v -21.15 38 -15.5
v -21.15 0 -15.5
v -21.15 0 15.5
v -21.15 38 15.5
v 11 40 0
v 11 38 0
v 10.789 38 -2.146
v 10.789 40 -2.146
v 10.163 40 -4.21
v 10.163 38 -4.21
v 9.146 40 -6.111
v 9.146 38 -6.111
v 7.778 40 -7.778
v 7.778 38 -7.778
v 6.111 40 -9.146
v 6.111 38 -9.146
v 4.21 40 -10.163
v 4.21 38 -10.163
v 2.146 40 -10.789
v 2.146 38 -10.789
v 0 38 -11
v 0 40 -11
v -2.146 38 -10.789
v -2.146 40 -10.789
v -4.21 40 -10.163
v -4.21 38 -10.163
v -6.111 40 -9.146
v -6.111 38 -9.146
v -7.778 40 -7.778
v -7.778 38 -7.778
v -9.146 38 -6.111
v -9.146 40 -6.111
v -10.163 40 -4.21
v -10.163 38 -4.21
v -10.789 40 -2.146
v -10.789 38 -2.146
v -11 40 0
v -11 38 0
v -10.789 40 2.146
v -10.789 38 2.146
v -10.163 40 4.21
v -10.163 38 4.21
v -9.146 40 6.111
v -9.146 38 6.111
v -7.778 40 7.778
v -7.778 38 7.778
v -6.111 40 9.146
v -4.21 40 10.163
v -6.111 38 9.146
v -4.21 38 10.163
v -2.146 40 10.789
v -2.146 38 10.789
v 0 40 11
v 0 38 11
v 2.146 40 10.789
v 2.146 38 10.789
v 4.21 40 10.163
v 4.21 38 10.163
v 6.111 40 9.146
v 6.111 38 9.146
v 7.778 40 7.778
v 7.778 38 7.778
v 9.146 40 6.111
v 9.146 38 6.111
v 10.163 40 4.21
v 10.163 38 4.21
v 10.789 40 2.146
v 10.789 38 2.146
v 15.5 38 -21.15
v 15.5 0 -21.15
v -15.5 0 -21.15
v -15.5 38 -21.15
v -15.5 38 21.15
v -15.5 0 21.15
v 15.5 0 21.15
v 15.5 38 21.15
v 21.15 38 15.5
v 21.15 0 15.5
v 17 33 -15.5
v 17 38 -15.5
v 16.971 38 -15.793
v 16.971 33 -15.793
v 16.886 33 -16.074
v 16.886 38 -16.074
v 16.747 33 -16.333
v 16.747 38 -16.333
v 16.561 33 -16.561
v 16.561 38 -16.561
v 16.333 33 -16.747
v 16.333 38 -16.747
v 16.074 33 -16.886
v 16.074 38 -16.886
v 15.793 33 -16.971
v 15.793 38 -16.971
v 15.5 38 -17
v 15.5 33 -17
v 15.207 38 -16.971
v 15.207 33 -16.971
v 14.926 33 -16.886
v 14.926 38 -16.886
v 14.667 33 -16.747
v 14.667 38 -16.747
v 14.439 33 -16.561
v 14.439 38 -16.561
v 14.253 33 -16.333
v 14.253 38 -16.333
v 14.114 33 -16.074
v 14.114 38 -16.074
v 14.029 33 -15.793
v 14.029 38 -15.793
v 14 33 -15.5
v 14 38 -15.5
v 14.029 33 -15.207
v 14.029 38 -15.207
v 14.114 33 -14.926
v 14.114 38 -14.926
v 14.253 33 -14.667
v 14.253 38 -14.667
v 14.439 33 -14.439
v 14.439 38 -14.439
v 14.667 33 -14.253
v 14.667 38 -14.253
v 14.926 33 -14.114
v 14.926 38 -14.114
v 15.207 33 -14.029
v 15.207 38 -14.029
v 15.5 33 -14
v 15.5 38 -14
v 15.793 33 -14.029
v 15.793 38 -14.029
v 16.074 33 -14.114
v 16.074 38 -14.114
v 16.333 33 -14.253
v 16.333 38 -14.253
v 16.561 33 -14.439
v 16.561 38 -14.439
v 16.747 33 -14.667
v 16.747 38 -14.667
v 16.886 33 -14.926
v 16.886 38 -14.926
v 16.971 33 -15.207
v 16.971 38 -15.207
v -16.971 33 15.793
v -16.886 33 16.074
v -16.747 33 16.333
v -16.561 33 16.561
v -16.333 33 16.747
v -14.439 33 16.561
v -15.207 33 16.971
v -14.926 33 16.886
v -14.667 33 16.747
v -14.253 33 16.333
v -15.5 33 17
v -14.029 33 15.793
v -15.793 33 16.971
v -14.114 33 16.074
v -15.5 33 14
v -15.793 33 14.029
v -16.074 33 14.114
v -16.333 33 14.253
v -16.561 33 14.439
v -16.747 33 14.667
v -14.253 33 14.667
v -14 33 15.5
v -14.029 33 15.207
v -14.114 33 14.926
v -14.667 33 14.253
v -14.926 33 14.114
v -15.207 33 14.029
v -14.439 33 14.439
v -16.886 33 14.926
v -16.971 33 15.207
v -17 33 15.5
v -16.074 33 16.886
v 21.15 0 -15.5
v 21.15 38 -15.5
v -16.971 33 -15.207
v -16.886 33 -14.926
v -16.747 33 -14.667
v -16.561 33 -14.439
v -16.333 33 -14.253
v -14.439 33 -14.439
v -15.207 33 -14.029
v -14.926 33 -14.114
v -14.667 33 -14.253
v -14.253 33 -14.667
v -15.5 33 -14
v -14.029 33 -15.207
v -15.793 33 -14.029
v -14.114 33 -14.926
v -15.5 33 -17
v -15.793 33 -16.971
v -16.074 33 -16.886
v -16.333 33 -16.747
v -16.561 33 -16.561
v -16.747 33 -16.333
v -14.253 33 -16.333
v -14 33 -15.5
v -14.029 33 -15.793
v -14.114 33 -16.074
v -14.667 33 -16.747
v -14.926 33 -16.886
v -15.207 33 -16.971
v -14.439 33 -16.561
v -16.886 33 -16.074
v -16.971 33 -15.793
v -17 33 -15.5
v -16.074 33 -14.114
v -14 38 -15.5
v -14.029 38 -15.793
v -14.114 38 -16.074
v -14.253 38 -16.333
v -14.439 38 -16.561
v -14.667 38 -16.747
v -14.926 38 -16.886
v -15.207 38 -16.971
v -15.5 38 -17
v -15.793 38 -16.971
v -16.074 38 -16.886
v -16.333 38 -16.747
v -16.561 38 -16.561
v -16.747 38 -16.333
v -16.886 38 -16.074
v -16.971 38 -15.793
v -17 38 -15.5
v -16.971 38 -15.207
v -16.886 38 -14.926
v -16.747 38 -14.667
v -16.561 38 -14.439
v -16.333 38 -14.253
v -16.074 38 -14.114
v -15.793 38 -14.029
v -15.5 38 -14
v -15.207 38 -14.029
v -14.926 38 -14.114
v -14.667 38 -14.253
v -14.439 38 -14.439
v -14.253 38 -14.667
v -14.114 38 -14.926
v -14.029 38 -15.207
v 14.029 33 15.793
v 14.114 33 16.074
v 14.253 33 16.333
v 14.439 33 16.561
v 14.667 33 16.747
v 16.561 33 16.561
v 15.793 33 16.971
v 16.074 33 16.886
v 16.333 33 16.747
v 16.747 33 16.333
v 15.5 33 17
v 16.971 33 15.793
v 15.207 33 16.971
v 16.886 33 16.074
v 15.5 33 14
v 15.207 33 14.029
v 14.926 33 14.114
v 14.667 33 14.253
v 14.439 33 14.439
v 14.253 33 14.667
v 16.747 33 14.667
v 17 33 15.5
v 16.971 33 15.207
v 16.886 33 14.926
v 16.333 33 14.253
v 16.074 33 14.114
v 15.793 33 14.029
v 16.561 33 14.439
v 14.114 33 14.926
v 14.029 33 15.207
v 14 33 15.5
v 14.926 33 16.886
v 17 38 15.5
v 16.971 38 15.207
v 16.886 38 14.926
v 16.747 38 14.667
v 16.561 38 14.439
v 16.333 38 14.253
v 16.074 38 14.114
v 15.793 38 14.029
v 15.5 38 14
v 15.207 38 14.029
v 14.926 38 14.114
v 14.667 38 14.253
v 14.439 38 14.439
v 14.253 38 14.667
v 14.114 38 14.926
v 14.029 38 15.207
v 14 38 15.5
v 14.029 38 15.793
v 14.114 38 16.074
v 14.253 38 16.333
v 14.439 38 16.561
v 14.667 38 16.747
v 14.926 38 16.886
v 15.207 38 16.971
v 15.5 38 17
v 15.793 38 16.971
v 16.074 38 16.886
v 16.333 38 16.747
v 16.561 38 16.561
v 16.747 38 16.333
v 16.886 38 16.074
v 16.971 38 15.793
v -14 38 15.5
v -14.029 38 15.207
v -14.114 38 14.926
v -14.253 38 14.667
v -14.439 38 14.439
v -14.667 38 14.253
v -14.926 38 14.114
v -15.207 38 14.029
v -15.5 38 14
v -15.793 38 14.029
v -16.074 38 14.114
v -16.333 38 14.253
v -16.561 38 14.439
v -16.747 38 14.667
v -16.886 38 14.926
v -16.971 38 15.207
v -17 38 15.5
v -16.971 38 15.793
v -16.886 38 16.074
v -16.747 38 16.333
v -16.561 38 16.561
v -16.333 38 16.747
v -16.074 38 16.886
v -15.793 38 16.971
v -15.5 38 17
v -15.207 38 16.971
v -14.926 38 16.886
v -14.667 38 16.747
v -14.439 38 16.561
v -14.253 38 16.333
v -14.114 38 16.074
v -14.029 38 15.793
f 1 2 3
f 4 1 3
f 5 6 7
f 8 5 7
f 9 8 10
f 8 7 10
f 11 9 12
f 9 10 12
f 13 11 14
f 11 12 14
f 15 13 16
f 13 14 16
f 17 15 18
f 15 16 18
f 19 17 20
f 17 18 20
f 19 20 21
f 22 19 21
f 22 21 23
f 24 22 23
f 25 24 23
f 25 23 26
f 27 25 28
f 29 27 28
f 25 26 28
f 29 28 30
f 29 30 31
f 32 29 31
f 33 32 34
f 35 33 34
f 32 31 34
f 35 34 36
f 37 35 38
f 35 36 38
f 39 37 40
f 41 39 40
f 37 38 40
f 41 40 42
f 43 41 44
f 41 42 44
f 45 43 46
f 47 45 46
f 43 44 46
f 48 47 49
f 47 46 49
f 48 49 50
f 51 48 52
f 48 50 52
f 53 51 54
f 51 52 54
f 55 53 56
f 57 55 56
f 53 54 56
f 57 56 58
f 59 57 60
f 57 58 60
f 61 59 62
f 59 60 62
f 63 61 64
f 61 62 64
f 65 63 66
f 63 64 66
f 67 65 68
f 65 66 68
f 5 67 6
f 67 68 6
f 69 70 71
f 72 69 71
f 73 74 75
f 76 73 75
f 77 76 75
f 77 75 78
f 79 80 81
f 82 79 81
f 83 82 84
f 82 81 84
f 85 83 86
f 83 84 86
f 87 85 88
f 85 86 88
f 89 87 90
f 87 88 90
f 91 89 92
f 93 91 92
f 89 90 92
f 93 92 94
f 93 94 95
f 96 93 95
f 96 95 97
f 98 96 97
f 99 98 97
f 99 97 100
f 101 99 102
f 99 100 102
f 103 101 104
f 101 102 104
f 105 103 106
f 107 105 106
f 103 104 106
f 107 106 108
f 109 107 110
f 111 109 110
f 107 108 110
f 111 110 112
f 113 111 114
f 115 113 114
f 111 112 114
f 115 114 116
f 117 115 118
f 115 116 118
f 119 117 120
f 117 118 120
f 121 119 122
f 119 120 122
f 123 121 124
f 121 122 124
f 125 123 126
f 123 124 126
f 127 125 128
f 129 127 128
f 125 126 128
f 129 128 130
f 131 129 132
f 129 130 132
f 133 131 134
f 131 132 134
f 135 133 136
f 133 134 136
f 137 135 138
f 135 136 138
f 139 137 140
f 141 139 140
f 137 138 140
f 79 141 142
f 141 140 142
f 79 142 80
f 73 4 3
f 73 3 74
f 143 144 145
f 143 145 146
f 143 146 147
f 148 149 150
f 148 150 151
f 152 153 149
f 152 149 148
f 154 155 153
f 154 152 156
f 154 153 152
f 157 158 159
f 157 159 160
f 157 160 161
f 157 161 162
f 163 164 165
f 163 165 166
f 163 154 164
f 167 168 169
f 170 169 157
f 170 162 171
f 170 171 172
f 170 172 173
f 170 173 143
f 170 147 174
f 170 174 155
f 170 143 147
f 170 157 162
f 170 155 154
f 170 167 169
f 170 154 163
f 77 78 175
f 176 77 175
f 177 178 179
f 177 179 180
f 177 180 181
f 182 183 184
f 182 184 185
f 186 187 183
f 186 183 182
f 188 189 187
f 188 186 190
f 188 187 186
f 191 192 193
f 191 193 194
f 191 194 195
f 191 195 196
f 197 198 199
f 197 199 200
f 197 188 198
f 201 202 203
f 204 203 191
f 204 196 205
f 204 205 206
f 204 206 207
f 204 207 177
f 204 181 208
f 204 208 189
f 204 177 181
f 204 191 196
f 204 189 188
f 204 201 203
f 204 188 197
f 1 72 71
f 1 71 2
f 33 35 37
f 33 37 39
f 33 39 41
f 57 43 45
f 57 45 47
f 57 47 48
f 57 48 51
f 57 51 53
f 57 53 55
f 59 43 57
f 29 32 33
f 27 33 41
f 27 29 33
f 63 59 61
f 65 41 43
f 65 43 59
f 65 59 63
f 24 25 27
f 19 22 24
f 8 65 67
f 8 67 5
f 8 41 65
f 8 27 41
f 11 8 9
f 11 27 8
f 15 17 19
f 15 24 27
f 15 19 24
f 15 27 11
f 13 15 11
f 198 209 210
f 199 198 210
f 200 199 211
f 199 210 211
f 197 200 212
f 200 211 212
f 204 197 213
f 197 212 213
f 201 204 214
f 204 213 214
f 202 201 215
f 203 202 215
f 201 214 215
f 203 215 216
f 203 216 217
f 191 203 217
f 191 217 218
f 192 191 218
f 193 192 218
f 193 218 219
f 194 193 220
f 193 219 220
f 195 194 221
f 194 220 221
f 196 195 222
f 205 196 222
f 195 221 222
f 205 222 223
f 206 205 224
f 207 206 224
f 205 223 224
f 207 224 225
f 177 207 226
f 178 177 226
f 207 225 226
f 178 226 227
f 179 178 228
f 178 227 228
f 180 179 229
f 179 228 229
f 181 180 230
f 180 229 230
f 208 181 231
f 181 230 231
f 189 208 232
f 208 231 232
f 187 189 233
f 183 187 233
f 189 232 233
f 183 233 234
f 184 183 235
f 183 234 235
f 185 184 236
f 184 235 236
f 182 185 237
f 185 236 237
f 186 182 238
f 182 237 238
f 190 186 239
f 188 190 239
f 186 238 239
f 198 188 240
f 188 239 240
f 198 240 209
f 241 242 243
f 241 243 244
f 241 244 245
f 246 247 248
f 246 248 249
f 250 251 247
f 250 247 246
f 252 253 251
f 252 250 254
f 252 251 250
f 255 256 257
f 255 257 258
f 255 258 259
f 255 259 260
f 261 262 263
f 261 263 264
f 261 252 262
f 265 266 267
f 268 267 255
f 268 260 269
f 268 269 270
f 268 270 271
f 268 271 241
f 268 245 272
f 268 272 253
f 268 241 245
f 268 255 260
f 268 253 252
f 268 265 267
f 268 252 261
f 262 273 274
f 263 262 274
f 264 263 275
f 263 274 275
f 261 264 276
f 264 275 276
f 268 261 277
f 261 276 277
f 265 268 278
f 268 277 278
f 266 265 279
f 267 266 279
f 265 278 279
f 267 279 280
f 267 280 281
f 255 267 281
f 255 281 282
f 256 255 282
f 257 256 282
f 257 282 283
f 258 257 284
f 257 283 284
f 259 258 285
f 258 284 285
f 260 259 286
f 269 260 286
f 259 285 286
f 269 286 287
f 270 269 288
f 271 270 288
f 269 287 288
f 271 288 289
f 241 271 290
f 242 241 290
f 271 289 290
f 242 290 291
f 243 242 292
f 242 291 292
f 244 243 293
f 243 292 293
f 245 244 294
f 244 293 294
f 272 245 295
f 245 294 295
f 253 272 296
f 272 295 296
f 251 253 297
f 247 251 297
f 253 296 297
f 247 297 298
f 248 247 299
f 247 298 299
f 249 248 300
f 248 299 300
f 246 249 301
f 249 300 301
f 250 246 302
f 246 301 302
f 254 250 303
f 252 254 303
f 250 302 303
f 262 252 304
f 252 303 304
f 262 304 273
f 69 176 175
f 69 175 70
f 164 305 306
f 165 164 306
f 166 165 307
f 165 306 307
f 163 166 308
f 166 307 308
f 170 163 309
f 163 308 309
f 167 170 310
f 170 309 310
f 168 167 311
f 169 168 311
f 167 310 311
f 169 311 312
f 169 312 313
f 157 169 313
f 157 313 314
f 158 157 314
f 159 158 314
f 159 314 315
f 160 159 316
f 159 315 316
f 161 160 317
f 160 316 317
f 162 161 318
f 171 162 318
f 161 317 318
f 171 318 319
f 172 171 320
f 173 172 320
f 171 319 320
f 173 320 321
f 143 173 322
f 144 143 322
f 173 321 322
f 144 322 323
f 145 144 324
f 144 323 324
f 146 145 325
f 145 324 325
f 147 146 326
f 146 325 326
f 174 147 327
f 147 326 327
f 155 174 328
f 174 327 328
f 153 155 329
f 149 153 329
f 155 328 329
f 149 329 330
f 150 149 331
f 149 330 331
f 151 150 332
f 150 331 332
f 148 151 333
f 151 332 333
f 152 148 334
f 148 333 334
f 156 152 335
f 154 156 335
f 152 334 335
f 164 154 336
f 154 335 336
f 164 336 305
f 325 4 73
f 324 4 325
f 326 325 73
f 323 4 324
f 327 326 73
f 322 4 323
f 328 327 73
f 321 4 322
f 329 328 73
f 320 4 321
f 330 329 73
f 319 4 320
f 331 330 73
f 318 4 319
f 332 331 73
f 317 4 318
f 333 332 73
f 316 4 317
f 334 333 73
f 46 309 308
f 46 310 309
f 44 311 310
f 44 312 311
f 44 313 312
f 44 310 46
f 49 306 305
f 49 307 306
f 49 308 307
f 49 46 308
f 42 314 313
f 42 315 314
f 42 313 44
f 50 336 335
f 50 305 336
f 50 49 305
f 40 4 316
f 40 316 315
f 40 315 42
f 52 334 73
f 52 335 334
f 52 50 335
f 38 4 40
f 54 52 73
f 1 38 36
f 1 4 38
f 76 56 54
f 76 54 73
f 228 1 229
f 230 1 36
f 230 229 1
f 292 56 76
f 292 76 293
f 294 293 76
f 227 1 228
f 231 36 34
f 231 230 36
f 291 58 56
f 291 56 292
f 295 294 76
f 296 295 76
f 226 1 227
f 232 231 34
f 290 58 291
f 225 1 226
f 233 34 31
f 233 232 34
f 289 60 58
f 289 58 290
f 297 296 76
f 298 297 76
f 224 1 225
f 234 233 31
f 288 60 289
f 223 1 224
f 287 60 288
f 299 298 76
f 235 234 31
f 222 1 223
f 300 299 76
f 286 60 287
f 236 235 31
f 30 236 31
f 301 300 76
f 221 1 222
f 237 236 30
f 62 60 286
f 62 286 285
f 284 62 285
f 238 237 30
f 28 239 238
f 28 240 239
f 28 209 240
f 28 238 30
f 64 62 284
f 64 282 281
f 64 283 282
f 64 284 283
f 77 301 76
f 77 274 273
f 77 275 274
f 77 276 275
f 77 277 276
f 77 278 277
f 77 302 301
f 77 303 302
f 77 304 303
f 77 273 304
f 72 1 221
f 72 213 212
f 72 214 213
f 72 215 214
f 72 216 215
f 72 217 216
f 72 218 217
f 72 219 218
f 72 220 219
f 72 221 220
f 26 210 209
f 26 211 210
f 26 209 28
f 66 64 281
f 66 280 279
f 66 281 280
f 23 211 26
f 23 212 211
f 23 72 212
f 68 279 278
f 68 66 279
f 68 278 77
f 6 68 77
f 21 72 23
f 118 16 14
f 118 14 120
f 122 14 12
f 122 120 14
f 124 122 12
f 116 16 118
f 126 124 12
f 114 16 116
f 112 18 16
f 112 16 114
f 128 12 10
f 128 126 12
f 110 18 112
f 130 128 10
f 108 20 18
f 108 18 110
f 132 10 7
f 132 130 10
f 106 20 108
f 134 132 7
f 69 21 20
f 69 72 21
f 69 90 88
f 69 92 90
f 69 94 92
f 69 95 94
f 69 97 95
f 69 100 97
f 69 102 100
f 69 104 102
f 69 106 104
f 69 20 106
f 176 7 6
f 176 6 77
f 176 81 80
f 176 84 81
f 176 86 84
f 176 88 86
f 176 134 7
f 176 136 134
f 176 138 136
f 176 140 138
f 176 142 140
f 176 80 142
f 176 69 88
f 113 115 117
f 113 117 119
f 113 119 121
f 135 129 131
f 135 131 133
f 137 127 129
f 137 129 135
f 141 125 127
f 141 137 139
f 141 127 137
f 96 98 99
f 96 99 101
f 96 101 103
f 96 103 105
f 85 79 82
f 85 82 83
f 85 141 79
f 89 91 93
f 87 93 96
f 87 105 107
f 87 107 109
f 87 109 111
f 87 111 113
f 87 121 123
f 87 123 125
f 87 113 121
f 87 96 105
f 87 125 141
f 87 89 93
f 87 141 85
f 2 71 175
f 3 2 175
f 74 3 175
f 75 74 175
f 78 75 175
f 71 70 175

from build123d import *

# Parameters (mm, degrees)
EXTRUDE_1_DEPTH     = 38
SKETCH_3_R          = 11
EXTRUDE_2_DEPTH     = 2
SKETCH_15_R         = 1.5
CUT_EXTRUDE_1_DEPTH = 5


with BuildPart() as part:
    # 草图2 → 凸台-拉伸1 (new body)
    with BuildSketch(Plane(origin=(0, 0, 0), x_dir=(1, 0, 0), z_dir=(0, 1, 0))):
        Polygon((-15.5, 21.15), (-21.15, 15.5), (-21.15, -15.5), (-15.5, -21.15), (15.5, -21.15), (21.15, -15.5), (21.15, 15.5), (15.5, 21.15), align=None)
    extrude(amount=EXTRUDE_1_DEPTH)

    # 草图3 → 凸台-拉伸2 (add)
    with BuildSketch(Plane(origin=(0, 38, 0), x_dir=(1, 0, 0), z_dir=(0, 1, 0))):
        Circle(SKETCH_3_R)
    extrude(amount=EXTRUDE_2_DEPTH)

    # 草图15 → 切除-拉伸1 (cut)
    with BuildSketch(Plane(origin=(0, 38, 0), x_dir=(1, 0, 0), z_dir=(0, 1, 0))):
        with Locations((-15.5, 15.5)):
            Circle(SKETCH_15_R)
        with Locations((15.5, 15.5)):
            Circle(SKETCH_15_R)
        with Locations((15.5, -15.5)):
            Circle(SKETCH_15_R)
        with Locations((-15.5, -15.5)):
            Circle(SKETCH_15_R)
    extrude(amount=-CUT_EXTRUDE_1_DEPTH, mode=Mode.SUBTRACT)


solid = part.part
